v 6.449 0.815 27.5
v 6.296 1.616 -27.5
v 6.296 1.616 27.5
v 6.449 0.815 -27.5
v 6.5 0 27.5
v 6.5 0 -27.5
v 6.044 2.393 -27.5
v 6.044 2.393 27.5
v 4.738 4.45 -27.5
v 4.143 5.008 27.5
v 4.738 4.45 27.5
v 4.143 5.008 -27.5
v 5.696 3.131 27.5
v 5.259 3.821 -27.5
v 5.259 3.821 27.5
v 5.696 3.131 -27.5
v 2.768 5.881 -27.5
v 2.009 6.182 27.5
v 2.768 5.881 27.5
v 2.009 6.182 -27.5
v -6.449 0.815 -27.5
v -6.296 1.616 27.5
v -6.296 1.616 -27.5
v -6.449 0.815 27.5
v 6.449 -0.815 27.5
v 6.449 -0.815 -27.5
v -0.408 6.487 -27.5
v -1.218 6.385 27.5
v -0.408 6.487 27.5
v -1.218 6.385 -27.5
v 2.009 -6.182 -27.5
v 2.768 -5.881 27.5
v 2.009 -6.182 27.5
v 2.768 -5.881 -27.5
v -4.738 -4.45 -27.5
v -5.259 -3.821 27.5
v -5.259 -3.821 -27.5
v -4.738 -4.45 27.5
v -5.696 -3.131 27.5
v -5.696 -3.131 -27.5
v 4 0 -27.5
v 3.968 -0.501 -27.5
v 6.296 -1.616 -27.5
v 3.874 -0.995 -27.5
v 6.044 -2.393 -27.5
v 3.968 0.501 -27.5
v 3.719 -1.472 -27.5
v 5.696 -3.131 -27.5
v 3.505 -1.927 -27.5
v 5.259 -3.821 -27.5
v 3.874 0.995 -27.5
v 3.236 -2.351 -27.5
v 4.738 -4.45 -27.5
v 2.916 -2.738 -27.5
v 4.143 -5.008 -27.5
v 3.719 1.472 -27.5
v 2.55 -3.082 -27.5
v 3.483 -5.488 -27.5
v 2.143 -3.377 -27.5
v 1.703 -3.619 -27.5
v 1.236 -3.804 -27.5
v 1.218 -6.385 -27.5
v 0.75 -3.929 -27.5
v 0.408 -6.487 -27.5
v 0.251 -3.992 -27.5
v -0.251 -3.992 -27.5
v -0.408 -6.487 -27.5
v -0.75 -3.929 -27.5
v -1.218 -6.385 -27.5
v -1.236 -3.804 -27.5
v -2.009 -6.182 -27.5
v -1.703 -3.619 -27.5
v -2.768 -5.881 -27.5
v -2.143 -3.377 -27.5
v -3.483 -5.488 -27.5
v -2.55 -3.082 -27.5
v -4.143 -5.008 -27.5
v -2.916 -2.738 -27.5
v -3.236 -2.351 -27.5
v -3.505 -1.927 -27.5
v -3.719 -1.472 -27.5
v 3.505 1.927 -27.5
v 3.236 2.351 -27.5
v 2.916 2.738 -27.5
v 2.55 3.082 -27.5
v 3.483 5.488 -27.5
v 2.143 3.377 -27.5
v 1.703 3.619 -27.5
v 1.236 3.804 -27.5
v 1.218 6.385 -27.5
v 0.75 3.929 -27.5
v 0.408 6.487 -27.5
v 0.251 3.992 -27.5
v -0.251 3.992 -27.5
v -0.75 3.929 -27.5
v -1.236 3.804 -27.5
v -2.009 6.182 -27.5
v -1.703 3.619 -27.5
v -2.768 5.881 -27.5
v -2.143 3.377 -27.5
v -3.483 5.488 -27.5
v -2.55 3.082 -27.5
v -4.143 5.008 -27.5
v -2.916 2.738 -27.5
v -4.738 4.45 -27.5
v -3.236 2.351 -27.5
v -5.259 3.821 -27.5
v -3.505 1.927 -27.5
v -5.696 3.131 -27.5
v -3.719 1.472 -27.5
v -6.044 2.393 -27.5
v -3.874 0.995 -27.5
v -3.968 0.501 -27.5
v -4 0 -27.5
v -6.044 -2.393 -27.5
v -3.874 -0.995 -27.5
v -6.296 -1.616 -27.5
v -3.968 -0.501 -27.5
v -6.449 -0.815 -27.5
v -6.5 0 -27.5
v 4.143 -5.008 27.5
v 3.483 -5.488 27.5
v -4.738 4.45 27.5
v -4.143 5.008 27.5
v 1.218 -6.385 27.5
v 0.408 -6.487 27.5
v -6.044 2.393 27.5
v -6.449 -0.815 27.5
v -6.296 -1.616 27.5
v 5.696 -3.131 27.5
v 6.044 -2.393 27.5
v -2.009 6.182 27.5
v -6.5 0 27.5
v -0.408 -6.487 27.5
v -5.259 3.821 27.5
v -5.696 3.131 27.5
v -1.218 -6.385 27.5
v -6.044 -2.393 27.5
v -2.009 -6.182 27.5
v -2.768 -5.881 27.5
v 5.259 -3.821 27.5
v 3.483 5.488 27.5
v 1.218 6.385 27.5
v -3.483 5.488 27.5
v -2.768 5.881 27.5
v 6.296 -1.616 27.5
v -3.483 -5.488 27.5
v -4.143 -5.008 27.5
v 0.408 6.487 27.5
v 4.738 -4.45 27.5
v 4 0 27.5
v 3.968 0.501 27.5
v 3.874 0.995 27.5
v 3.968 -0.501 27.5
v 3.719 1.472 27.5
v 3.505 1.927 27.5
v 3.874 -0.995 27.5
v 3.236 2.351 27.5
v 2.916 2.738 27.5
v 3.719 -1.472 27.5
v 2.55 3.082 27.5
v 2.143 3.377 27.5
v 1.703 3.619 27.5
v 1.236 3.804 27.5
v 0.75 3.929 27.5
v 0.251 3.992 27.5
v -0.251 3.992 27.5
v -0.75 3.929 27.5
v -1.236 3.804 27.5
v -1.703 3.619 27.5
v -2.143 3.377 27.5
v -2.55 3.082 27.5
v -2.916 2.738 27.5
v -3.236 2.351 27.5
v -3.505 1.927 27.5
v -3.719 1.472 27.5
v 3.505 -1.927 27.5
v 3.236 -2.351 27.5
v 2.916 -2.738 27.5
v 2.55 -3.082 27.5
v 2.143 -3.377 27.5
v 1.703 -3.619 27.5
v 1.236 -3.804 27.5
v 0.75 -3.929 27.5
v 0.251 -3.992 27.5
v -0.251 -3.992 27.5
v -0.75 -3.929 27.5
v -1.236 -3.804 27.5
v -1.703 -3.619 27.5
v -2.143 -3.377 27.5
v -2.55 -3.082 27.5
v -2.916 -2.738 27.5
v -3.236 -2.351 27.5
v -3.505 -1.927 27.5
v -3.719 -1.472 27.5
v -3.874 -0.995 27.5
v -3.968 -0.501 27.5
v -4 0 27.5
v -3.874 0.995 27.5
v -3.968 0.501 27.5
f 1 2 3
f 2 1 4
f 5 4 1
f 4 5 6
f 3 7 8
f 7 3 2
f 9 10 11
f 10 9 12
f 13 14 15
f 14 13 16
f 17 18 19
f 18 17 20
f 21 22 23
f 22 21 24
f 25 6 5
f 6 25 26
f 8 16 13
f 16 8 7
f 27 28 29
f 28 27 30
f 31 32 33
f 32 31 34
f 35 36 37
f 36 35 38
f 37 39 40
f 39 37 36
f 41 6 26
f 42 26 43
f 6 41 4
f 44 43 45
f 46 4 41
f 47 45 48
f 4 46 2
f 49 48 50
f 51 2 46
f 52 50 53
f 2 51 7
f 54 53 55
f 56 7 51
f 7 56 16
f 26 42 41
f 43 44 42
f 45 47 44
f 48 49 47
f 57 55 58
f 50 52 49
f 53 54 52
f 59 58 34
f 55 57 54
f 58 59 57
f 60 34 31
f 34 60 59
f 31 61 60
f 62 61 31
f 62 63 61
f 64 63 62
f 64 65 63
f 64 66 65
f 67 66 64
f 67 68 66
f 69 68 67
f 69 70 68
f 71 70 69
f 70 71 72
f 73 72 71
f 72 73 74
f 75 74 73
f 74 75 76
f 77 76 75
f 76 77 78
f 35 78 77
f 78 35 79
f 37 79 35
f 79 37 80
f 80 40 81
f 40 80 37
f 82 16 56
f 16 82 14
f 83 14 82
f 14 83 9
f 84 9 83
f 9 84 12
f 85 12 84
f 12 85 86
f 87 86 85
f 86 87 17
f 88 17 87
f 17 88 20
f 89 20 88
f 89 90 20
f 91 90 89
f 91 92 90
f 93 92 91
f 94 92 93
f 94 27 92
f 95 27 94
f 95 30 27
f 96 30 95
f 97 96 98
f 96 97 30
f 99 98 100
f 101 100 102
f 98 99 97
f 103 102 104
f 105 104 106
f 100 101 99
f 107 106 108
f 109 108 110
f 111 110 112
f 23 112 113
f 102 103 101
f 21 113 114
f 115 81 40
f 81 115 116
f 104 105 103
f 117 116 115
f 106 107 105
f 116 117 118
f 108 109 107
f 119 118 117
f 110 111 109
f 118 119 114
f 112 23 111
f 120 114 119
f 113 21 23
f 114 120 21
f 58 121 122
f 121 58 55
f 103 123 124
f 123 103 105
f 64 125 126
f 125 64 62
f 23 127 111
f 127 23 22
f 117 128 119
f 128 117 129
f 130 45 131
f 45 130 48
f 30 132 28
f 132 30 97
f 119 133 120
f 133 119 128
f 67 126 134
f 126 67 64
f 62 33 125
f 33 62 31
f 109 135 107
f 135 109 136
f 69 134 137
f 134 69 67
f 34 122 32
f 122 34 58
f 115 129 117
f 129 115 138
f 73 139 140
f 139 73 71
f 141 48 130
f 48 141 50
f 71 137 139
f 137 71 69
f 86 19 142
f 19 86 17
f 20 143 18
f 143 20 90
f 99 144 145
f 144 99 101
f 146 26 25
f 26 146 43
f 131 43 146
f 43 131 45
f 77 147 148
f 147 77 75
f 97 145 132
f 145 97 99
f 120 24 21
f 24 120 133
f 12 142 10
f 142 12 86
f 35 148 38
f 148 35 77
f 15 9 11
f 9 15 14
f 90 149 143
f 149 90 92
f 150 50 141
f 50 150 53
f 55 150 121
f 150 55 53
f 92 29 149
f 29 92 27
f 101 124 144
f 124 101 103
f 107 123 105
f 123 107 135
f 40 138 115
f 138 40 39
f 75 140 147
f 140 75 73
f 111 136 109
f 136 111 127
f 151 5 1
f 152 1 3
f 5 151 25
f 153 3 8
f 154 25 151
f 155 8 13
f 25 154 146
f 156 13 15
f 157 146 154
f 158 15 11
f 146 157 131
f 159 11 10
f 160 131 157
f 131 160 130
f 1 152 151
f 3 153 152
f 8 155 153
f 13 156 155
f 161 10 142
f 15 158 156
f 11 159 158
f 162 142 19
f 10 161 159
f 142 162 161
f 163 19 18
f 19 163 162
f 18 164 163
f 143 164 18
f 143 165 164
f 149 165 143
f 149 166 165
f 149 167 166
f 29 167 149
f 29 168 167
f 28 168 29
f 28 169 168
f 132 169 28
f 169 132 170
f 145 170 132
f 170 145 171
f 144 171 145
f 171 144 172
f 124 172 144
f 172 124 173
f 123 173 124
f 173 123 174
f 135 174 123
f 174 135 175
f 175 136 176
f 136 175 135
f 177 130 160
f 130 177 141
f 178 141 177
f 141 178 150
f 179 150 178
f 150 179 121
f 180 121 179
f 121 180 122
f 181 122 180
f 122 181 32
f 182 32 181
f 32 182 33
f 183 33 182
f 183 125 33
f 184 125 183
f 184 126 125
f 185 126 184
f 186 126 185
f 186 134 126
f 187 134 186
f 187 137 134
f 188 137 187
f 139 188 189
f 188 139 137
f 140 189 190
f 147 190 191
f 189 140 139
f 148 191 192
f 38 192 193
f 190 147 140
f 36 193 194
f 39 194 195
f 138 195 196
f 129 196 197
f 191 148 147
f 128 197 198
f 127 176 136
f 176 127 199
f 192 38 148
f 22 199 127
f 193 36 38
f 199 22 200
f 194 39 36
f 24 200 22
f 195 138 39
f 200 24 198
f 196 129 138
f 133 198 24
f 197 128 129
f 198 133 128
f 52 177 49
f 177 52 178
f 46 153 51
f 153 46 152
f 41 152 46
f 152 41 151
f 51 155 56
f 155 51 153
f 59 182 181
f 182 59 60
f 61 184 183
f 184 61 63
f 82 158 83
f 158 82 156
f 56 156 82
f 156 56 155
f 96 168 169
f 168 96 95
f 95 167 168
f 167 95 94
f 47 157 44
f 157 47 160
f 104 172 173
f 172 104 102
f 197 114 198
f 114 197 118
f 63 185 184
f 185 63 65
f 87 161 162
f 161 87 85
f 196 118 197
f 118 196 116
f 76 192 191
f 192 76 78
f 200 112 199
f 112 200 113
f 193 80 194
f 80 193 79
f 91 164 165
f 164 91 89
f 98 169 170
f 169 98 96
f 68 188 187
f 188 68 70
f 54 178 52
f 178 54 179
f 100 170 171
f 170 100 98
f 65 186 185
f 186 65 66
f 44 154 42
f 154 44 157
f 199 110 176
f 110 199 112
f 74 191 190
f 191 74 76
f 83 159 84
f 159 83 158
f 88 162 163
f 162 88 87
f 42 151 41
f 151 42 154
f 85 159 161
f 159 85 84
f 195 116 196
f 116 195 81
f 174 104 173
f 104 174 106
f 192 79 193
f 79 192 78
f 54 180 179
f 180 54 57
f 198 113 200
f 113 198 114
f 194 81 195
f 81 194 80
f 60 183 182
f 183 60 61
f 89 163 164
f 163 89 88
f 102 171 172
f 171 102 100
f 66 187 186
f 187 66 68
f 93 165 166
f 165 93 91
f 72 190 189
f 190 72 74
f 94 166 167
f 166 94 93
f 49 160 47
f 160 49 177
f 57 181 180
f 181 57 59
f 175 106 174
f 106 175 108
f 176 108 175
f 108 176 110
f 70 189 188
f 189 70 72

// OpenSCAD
$fn = 50;


difference() {
	union() {
		translate(v = [0, 0, -27.5000000000]) {
			cylinder(h = 55, r = 6.5000000000);
		}
	}
	union() {
		translate(v = [0, 0, -100.0000000000]) {
			cylinder(h = 200, r = 4.0000000000);
		}
	}
}
